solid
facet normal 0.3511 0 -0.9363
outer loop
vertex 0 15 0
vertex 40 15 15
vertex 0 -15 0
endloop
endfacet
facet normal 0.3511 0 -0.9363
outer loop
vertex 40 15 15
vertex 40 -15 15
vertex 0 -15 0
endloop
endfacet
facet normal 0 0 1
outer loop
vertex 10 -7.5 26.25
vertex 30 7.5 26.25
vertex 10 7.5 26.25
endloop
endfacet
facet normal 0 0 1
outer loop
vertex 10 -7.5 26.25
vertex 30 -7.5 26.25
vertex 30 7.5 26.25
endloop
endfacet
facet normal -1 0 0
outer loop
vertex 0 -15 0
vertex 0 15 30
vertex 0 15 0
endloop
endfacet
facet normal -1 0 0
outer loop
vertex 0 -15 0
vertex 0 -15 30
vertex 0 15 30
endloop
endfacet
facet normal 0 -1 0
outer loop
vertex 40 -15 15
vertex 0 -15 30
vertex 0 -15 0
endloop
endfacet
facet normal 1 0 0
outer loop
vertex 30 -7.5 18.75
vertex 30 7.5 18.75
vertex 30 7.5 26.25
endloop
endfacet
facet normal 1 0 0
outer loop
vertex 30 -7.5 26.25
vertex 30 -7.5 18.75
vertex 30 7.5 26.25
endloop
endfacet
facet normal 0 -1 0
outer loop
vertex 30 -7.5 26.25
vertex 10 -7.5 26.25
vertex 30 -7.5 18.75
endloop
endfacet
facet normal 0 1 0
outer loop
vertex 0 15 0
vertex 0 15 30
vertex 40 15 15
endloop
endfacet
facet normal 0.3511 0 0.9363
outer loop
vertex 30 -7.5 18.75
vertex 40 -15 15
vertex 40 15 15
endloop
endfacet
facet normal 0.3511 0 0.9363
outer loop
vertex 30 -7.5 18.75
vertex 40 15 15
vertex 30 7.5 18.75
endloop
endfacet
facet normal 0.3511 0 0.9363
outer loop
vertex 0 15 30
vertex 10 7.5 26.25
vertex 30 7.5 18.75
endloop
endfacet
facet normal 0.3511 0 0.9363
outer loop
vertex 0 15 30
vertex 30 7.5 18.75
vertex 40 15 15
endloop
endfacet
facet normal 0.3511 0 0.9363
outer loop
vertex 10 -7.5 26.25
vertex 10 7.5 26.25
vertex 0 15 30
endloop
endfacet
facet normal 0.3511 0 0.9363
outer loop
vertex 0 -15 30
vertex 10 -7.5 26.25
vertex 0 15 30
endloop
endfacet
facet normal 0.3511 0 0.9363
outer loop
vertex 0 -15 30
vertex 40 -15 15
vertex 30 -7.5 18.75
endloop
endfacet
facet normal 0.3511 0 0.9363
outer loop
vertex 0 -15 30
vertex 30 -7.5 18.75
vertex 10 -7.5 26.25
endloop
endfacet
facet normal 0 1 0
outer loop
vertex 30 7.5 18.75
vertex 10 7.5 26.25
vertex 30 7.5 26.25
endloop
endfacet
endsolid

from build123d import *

# Parameters (mm, degrees)
F1_DEPTH = 15
F2_DEPTH = 7.5
F3_DEPTH = 15


with BuildPart() as f1:
    # F0 (on Front) → F1 (new body, symmetric)
    with BuildSketch(Plane.XZ):
        Polygon((40, 15), (0, 0), (40, 0), align=None)
        Polygon((30, 18.75), (10, 26.25), (10, 18.75), align=None)
        Polygon((0, 30), (0, 0), (40, 15), (30, 18.75), (10, 18.75), (10, 26.25), align=None)
    extrude(amount=F1_DEPTH, both=True)

    # F0 (on Front) → F2 (join, symmetric)
    with BuildSketch(Plane.XZ):
        Polygon((30, 26.25), (10, 26.25), (30, 18.75), align=None)
    extrude(amount=F2_DEPTH, both=True)

    # F0 (on Front) → F3 (cut, symmetric)
    with BuildSketch(Plane.XZ):
        Polygon((40, 15), (0, 0), (40, 0), align=None)
    extrude(amount=F3_DEPTH, both=True, mode=Mode.SUBTRACT)


solid = f1.part
